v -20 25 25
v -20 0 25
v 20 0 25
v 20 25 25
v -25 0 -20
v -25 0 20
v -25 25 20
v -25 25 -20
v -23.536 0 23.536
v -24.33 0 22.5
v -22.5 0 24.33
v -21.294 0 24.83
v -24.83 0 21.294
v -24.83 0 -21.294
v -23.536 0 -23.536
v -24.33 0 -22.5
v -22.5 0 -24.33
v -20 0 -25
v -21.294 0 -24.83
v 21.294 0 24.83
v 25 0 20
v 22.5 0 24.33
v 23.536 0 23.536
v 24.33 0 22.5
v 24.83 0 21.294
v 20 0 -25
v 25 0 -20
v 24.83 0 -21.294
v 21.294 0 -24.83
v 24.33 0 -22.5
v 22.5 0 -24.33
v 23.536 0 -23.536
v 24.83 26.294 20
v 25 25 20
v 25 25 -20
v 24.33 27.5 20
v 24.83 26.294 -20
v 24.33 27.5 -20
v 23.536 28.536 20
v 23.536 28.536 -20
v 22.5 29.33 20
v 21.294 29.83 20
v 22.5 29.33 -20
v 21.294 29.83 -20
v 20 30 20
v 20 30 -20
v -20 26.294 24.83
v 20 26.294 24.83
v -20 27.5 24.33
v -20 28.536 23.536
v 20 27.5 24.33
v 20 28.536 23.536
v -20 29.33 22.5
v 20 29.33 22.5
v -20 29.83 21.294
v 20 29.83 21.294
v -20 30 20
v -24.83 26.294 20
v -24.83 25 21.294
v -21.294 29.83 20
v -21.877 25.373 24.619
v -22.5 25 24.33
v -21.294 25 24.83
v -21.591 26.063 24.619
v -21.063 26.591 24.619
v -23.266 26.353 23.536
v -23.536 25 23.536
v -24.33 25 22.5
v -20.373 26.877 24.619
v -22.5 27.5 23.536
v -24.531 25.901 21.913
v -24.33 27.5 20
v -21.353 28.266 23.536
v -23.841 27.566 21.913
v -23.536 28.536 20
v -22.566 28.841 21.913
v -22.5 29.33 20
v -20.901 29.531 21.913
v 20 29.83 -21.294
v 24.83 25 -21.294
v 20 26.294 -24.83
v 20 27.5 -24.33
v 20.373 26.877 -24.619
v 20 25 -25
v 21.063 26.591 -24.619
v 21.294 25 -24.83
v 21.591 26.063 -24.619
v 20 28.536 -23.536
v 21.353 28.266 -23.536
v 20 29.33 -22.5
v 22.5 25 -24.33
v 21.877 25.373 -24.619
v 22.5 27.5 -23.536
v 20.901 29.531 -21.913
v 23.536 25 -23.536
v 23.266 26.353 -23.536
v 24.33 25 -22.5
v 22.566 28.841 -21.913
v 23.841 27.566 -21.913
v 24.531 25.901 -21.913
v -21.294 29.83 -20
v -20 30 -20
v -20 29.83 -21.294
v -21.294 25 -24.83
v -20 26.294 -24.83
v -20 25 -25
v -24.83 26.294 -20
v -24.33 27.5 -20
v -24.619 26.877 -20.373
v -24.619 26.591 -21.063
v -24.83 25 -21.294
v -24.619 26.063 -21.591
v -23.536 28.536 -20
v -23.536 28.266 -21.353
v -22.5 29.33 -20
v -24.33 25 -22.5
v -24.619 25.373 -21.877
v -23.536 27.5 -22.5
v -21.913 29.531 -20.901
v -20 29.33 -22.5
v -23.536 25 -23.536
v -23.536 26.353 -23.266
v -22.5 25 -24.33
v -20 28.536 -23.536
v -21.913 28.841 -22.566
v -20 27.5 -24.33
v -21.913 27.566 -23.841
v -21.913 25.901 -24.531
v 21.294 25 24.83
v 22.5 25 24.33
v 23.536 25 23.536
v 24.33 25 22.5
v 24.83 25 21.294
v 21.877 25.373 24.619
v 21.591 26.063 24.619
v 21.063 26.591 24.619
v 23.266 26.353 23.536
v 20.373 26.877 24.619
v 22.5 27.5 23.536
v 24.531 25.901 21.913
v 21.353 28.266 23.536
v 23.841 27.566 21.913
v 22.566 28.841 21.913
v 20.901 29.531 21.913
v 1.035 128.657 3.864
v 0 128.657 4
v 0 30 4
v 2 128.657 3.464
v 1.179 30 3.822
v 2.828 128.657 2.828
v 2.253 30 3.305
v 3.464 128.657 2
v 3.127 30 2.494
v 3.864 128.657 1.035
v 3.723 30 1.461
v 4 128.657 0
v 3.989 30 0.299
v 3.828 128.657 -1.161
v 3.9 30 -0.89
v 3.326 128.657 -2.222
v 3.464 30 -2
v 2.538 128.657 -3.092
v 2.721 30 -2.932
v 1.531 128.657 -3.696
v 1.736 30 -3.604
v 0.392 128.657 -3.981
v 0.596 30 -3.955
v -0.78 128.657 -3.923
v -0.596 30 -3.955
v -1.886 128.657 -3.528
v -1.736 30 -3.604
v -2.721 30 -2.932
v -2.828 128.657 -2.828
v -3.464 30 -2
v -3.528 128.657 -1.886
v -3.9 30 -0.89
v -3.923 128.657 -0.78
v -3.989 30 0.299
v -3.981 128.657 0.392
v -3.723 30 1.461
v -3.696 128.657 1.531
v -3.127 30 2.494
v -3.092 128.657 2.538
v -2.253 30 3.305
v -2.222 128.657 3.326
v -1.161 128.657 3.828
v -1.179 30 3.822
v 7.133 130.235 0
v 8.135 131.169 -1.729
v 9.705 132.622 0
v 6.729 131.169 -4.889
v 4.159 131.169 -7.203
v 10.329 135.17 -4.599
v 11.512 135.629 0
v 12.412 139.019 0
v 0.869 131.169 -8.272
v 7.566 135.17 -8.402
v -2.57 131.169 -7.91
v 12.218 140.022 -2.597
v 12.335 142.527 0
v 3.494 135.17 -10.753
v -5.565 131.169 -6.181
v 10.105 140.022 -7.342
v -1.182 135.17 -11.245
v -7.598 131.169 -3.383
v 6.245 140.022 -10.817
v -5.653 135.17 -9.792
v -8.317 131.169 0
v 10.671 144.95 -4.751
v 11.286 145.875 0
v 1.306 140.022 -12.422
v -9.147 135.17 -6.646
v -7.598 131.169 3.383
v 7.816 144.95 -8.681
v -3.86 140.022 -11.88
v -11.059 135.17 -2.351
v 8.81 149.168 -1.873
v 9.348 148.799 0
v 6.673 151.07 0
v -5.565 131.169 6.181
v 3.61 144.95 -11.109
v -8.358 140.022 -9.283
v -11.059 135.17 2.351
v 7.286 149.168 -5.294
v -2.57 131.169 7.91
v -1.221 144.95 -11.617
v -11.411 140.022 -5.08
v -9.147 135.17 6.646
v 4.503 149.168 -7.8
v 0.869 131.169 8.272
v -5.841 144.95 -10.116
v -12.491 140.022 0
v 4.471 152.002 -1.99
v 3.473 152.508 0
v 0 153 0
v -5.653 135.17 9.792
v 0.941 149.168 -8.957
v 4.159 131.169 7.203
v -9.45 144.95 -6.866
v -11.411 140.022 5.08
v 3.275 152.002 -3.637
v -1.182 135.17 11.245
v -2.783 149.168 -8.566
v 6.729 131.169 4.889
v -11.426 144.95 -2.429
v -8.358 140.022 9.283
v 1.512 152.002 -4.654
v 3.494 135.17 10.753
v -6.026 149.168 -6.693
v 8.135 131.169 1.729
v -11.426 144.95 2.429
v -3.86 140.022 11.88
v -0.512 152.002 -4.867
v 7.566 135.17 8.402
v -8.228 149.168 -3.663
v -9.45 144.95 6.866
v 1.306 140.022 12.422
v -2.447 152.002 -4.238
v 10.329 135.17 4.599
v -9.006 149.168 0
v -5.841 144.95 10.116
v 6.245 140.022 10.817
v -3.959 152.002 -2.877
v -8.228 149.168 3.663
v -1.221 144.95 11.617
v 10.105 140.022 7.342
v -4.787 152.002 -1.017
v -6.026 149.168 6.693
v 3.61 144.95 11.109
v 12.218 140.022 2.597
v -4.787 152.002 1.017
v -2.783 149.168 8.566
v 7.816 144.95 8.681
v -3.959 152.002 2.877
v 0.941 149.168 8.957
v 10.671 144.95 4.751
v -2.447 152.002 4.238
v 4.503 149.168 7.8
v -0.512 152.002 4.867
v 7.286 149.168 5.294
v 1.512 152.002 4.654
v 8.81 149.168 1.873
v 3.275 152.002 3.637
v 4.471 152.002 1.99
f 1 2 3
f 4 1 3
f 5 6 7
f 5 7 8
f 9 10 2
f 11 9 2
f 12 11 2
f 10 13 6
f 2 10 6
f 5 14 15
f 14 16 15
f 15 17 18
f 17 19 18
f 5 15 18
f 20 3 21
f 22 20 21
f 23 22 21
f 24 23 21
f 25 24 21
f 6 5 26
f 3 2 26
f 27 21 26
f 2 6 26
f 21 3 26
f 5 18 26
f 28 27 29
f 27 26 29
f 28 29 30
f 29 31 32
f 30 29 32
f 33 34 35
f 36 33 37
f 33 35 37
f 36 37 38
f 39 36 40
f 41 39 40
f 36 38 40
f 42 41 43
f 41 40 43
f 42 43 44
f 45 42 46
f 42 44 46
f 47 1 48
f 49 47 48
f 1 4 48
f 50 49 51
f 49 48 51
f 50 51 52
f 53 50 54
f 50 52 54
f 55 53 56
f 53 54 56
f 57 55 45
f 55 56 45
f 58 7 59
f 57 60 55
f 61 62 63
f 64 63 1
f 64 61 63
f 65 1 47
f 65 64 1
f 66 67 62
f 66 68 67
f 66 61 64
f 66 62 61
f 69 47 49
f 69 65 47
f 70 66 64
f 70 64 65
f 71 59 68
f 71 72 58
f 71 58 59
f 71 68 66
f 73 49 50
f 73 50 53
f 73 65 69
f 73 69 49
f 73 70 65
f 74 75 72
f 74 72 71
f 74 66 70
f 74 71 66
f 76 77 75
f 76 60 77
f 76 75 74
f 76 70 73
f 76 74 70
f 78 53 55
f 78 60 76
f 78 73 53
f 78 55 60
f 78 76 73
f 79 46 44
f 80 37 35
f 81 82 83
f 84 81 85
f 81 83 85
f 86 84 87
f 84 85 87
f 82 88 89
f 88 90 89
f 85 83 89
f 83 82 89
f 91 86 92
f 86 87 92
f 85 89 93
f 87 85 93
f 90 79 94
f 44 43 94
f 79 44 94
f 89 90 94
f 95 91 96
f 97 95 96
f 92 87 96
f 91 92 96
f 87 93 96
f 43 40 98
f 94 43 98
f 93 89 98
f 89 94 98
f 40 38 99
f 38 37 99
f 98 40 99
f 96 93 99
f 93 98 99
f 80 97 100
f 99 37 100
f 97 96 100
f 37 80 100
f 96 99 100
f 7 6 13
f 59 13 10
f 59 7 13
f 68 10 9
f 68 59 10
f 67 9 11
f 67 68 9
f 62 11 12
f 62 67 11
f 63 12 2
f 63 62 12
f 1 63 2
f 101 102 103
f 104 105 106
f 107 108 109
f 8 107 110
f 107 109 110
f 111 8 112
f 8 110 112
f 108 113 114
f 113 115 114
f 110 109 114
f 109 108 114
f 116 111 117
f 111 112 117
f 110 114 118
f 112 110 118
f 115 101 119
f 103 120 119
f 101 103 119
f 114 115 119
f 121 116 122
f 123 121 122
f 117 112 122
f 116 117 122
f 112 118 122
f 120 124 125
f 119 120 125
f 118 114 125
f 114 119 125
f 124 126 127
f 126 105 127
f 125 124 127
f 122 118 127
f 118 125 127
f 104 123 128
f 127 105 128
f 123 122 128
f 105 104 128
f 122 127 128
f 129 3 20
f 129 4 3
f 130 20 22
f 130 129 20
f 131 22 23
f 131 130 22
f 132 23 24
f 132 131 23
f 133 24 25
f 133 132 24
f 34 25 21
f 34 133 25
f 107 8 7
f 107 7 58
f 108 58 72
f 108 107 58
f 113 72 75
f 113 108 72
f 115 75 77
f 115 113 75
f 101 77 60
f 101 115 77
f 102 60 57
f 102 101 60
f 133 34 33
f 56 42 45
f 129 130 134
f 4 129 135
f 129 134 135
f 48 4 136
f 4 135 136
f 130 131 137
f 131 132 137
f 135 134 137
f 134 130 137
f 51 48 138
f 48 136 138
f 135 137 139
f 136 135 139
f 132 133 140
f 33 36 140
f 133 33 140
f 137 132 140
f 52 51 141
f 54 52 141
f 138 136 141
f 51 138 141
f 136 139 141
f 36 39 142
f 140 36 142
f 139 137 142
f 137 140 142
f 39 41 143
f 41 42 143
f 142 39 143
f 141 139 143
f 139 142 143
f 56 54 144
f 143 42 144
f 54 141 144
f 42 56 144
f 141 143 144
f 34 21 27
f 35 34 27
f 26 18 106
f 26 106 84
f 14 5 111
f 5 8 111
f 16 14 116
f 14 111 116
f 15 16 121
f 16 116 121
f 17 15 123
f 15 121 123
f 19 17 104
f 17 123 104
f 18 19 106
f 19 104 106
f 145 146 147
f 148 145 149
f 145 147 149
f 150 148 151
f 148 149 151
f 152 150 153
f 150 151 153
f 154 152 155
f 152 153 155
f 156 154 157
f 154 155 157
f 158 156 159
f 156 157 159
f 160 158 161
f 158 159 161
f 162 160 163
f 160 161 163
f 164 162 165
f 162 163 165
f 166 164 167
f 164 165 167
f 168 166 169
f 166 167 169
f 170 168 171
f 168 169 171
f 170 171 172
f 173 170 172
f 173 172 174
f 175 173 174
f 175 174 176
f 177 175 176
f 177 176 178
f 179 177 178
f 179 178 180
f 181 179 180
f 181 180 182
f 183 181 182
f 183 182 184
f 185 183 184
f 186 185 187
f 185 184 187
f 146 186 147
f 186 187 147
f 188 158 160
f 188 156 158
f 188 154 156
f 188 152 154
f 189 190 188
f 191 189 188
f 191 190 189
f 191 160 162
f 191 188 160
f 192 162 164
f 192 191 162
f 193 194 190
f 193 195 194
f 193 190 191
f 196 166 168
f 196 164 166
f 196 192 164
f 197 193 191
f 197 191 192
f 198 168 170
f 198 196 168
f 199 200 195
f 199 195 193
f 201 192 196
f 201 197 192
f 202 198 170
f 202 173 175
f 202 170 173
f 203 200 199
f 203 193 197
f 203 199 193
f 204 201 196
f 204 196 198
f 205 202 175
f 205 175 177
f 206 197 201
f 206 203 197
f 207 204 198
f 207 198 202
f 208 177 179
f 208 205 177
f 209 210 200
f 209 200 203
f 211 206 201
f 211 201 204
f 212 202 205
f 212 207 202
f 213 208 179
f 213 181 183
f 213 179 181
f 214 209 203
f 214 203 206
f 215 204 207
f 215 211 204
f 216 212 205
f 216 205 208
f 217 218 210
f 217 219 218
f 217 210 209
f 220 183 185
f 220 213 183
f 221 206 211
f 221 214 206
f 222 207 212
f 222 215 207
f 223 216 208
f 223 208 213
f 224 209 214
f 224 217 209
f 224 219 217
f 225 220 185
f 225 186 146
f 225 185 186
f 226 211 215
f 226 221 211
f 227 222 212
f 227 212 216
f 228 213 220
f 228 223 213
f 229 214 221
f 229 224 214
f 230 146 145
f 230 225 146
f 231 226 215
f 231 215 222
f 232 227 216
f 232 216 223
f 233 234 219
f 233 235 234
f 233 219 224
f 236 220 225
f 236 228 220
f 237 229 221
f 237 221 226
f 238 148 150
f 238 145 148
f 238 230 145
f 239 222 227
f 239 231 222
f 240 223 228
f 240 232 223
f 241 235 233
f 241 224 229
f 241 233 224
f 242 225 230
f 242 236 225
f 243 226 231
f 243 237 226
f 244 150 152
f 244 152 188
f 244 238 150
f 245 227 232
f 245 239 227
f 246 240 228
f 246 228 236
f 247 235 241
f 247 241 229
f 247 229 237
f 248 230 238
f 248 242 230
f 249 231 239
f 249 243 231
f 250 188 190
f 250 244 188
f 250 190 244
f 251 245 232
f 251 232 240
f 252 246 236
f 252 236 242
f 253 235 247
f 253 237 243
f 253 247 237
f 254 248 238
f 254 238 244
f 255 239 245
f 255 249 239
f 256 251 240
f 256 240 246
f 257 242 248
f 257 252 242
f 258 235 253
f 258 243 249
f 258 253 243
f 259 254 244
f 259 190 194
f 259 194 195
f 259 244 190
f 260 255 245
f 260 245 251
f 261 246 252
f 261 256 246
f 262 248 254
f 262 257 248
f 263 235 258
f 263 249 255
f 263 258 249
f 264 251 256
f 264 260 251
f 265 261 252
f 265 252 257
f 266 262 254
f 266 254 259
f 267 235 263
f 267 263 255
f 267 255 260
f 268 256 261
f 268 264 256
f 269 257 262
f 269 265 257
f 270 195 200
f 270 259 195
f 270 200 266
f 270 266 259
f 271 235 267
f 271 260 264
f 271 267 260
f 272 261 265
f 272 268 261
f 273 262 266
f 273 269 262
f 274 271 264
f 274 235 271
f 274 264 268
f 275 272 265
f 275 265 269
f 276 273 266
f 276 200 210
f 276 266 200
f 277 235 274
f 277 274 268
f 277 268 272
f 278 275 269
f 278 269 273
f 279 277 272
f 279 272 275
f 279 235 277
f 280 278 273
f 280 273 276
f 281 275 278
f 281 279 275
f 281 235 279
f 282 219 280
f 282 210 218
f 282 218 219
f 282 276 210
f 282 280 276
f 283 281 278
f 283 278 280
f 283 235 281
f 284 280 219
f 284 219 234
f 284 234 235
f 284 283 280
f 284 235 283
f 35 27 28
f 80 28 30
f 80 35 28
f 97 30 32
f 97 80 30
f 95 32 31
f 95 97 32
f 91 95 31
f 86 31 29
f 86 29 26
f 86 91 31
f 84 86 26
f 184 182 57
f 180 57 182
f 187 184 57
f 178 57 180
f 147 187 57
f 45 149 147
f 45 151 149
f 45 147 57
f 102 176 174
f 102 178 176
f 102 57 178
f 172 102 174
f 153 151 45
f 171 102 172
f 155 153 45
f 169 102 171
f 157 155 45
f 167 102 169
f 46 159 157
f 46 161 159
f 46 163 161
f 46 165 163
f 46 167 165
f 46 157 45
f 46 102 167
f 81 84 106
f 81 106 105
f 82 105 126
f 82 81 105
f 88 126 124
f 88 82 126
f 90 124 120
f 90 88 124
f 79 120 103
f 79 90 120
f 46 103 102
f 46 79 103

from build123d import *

# Parameters (mm, degrees)
SKETCH_1_W      = 50
SKETCH_1_H      = 50
EXTRUDE_1_DEPTH = 30
FILLET_1_R      = 5
SKETCH_2_R      = 4
EXTRUDE_2_DEPTH = 100


with BuildPart() as part:
    # 草图1 → 凸台-拉伸1 (new body)
    with BuildSketch(Plane(origin=(0, 0, 0), x_dir=(1, 0, 0), z_dir=(0, 1, 0))):
        Rectangle(SKETCH_1_W, SKETCH_1_H)
    extrude(amount=EXTRUDE_1_DEPTH)

    # 圆角1
    fillet_1_edges = [part.edges().sort_by_distance(p)[0] for p in [
        (25, 30, 0),
        (0, 30, -25),
        (-25, 30, 0),
        (-25, 15, -25),
        (25, 15, -25),
        (25, 15, 25),
        (-25, 15, 25),
        (0, 30, 25),
    ]]
    fillet(fillet_1_edges, radius=FILLET_1_R)

    # 草图2 → 凸台-拉伸2 (add)
    with BuildSketch(Plane(origin=(0, 30, 0), x_dir=(1, 0, 0), z_dir=(0, 1, 0))):
        with Locations(Location((0, 0, 0), (0, 0, 270))):
            Circle(SKETCH_2_R)
    extrude(amount=EXTRUDE_2_DEPTH)

    # 草图3 → 旋转1 (revolve)
    with BuildSketch(Plane.XY):
        with BuildLine():
            Line((0, 130), (0, 128))
            ThreePointArc((0, 128), (12.5, 140.5), (0, 153))
            Line((0, 153), (0, 130))
        make_face()
    revolve(axis=Axis((0, 130, 0), (0, 1, 0)))


solid = part.part
